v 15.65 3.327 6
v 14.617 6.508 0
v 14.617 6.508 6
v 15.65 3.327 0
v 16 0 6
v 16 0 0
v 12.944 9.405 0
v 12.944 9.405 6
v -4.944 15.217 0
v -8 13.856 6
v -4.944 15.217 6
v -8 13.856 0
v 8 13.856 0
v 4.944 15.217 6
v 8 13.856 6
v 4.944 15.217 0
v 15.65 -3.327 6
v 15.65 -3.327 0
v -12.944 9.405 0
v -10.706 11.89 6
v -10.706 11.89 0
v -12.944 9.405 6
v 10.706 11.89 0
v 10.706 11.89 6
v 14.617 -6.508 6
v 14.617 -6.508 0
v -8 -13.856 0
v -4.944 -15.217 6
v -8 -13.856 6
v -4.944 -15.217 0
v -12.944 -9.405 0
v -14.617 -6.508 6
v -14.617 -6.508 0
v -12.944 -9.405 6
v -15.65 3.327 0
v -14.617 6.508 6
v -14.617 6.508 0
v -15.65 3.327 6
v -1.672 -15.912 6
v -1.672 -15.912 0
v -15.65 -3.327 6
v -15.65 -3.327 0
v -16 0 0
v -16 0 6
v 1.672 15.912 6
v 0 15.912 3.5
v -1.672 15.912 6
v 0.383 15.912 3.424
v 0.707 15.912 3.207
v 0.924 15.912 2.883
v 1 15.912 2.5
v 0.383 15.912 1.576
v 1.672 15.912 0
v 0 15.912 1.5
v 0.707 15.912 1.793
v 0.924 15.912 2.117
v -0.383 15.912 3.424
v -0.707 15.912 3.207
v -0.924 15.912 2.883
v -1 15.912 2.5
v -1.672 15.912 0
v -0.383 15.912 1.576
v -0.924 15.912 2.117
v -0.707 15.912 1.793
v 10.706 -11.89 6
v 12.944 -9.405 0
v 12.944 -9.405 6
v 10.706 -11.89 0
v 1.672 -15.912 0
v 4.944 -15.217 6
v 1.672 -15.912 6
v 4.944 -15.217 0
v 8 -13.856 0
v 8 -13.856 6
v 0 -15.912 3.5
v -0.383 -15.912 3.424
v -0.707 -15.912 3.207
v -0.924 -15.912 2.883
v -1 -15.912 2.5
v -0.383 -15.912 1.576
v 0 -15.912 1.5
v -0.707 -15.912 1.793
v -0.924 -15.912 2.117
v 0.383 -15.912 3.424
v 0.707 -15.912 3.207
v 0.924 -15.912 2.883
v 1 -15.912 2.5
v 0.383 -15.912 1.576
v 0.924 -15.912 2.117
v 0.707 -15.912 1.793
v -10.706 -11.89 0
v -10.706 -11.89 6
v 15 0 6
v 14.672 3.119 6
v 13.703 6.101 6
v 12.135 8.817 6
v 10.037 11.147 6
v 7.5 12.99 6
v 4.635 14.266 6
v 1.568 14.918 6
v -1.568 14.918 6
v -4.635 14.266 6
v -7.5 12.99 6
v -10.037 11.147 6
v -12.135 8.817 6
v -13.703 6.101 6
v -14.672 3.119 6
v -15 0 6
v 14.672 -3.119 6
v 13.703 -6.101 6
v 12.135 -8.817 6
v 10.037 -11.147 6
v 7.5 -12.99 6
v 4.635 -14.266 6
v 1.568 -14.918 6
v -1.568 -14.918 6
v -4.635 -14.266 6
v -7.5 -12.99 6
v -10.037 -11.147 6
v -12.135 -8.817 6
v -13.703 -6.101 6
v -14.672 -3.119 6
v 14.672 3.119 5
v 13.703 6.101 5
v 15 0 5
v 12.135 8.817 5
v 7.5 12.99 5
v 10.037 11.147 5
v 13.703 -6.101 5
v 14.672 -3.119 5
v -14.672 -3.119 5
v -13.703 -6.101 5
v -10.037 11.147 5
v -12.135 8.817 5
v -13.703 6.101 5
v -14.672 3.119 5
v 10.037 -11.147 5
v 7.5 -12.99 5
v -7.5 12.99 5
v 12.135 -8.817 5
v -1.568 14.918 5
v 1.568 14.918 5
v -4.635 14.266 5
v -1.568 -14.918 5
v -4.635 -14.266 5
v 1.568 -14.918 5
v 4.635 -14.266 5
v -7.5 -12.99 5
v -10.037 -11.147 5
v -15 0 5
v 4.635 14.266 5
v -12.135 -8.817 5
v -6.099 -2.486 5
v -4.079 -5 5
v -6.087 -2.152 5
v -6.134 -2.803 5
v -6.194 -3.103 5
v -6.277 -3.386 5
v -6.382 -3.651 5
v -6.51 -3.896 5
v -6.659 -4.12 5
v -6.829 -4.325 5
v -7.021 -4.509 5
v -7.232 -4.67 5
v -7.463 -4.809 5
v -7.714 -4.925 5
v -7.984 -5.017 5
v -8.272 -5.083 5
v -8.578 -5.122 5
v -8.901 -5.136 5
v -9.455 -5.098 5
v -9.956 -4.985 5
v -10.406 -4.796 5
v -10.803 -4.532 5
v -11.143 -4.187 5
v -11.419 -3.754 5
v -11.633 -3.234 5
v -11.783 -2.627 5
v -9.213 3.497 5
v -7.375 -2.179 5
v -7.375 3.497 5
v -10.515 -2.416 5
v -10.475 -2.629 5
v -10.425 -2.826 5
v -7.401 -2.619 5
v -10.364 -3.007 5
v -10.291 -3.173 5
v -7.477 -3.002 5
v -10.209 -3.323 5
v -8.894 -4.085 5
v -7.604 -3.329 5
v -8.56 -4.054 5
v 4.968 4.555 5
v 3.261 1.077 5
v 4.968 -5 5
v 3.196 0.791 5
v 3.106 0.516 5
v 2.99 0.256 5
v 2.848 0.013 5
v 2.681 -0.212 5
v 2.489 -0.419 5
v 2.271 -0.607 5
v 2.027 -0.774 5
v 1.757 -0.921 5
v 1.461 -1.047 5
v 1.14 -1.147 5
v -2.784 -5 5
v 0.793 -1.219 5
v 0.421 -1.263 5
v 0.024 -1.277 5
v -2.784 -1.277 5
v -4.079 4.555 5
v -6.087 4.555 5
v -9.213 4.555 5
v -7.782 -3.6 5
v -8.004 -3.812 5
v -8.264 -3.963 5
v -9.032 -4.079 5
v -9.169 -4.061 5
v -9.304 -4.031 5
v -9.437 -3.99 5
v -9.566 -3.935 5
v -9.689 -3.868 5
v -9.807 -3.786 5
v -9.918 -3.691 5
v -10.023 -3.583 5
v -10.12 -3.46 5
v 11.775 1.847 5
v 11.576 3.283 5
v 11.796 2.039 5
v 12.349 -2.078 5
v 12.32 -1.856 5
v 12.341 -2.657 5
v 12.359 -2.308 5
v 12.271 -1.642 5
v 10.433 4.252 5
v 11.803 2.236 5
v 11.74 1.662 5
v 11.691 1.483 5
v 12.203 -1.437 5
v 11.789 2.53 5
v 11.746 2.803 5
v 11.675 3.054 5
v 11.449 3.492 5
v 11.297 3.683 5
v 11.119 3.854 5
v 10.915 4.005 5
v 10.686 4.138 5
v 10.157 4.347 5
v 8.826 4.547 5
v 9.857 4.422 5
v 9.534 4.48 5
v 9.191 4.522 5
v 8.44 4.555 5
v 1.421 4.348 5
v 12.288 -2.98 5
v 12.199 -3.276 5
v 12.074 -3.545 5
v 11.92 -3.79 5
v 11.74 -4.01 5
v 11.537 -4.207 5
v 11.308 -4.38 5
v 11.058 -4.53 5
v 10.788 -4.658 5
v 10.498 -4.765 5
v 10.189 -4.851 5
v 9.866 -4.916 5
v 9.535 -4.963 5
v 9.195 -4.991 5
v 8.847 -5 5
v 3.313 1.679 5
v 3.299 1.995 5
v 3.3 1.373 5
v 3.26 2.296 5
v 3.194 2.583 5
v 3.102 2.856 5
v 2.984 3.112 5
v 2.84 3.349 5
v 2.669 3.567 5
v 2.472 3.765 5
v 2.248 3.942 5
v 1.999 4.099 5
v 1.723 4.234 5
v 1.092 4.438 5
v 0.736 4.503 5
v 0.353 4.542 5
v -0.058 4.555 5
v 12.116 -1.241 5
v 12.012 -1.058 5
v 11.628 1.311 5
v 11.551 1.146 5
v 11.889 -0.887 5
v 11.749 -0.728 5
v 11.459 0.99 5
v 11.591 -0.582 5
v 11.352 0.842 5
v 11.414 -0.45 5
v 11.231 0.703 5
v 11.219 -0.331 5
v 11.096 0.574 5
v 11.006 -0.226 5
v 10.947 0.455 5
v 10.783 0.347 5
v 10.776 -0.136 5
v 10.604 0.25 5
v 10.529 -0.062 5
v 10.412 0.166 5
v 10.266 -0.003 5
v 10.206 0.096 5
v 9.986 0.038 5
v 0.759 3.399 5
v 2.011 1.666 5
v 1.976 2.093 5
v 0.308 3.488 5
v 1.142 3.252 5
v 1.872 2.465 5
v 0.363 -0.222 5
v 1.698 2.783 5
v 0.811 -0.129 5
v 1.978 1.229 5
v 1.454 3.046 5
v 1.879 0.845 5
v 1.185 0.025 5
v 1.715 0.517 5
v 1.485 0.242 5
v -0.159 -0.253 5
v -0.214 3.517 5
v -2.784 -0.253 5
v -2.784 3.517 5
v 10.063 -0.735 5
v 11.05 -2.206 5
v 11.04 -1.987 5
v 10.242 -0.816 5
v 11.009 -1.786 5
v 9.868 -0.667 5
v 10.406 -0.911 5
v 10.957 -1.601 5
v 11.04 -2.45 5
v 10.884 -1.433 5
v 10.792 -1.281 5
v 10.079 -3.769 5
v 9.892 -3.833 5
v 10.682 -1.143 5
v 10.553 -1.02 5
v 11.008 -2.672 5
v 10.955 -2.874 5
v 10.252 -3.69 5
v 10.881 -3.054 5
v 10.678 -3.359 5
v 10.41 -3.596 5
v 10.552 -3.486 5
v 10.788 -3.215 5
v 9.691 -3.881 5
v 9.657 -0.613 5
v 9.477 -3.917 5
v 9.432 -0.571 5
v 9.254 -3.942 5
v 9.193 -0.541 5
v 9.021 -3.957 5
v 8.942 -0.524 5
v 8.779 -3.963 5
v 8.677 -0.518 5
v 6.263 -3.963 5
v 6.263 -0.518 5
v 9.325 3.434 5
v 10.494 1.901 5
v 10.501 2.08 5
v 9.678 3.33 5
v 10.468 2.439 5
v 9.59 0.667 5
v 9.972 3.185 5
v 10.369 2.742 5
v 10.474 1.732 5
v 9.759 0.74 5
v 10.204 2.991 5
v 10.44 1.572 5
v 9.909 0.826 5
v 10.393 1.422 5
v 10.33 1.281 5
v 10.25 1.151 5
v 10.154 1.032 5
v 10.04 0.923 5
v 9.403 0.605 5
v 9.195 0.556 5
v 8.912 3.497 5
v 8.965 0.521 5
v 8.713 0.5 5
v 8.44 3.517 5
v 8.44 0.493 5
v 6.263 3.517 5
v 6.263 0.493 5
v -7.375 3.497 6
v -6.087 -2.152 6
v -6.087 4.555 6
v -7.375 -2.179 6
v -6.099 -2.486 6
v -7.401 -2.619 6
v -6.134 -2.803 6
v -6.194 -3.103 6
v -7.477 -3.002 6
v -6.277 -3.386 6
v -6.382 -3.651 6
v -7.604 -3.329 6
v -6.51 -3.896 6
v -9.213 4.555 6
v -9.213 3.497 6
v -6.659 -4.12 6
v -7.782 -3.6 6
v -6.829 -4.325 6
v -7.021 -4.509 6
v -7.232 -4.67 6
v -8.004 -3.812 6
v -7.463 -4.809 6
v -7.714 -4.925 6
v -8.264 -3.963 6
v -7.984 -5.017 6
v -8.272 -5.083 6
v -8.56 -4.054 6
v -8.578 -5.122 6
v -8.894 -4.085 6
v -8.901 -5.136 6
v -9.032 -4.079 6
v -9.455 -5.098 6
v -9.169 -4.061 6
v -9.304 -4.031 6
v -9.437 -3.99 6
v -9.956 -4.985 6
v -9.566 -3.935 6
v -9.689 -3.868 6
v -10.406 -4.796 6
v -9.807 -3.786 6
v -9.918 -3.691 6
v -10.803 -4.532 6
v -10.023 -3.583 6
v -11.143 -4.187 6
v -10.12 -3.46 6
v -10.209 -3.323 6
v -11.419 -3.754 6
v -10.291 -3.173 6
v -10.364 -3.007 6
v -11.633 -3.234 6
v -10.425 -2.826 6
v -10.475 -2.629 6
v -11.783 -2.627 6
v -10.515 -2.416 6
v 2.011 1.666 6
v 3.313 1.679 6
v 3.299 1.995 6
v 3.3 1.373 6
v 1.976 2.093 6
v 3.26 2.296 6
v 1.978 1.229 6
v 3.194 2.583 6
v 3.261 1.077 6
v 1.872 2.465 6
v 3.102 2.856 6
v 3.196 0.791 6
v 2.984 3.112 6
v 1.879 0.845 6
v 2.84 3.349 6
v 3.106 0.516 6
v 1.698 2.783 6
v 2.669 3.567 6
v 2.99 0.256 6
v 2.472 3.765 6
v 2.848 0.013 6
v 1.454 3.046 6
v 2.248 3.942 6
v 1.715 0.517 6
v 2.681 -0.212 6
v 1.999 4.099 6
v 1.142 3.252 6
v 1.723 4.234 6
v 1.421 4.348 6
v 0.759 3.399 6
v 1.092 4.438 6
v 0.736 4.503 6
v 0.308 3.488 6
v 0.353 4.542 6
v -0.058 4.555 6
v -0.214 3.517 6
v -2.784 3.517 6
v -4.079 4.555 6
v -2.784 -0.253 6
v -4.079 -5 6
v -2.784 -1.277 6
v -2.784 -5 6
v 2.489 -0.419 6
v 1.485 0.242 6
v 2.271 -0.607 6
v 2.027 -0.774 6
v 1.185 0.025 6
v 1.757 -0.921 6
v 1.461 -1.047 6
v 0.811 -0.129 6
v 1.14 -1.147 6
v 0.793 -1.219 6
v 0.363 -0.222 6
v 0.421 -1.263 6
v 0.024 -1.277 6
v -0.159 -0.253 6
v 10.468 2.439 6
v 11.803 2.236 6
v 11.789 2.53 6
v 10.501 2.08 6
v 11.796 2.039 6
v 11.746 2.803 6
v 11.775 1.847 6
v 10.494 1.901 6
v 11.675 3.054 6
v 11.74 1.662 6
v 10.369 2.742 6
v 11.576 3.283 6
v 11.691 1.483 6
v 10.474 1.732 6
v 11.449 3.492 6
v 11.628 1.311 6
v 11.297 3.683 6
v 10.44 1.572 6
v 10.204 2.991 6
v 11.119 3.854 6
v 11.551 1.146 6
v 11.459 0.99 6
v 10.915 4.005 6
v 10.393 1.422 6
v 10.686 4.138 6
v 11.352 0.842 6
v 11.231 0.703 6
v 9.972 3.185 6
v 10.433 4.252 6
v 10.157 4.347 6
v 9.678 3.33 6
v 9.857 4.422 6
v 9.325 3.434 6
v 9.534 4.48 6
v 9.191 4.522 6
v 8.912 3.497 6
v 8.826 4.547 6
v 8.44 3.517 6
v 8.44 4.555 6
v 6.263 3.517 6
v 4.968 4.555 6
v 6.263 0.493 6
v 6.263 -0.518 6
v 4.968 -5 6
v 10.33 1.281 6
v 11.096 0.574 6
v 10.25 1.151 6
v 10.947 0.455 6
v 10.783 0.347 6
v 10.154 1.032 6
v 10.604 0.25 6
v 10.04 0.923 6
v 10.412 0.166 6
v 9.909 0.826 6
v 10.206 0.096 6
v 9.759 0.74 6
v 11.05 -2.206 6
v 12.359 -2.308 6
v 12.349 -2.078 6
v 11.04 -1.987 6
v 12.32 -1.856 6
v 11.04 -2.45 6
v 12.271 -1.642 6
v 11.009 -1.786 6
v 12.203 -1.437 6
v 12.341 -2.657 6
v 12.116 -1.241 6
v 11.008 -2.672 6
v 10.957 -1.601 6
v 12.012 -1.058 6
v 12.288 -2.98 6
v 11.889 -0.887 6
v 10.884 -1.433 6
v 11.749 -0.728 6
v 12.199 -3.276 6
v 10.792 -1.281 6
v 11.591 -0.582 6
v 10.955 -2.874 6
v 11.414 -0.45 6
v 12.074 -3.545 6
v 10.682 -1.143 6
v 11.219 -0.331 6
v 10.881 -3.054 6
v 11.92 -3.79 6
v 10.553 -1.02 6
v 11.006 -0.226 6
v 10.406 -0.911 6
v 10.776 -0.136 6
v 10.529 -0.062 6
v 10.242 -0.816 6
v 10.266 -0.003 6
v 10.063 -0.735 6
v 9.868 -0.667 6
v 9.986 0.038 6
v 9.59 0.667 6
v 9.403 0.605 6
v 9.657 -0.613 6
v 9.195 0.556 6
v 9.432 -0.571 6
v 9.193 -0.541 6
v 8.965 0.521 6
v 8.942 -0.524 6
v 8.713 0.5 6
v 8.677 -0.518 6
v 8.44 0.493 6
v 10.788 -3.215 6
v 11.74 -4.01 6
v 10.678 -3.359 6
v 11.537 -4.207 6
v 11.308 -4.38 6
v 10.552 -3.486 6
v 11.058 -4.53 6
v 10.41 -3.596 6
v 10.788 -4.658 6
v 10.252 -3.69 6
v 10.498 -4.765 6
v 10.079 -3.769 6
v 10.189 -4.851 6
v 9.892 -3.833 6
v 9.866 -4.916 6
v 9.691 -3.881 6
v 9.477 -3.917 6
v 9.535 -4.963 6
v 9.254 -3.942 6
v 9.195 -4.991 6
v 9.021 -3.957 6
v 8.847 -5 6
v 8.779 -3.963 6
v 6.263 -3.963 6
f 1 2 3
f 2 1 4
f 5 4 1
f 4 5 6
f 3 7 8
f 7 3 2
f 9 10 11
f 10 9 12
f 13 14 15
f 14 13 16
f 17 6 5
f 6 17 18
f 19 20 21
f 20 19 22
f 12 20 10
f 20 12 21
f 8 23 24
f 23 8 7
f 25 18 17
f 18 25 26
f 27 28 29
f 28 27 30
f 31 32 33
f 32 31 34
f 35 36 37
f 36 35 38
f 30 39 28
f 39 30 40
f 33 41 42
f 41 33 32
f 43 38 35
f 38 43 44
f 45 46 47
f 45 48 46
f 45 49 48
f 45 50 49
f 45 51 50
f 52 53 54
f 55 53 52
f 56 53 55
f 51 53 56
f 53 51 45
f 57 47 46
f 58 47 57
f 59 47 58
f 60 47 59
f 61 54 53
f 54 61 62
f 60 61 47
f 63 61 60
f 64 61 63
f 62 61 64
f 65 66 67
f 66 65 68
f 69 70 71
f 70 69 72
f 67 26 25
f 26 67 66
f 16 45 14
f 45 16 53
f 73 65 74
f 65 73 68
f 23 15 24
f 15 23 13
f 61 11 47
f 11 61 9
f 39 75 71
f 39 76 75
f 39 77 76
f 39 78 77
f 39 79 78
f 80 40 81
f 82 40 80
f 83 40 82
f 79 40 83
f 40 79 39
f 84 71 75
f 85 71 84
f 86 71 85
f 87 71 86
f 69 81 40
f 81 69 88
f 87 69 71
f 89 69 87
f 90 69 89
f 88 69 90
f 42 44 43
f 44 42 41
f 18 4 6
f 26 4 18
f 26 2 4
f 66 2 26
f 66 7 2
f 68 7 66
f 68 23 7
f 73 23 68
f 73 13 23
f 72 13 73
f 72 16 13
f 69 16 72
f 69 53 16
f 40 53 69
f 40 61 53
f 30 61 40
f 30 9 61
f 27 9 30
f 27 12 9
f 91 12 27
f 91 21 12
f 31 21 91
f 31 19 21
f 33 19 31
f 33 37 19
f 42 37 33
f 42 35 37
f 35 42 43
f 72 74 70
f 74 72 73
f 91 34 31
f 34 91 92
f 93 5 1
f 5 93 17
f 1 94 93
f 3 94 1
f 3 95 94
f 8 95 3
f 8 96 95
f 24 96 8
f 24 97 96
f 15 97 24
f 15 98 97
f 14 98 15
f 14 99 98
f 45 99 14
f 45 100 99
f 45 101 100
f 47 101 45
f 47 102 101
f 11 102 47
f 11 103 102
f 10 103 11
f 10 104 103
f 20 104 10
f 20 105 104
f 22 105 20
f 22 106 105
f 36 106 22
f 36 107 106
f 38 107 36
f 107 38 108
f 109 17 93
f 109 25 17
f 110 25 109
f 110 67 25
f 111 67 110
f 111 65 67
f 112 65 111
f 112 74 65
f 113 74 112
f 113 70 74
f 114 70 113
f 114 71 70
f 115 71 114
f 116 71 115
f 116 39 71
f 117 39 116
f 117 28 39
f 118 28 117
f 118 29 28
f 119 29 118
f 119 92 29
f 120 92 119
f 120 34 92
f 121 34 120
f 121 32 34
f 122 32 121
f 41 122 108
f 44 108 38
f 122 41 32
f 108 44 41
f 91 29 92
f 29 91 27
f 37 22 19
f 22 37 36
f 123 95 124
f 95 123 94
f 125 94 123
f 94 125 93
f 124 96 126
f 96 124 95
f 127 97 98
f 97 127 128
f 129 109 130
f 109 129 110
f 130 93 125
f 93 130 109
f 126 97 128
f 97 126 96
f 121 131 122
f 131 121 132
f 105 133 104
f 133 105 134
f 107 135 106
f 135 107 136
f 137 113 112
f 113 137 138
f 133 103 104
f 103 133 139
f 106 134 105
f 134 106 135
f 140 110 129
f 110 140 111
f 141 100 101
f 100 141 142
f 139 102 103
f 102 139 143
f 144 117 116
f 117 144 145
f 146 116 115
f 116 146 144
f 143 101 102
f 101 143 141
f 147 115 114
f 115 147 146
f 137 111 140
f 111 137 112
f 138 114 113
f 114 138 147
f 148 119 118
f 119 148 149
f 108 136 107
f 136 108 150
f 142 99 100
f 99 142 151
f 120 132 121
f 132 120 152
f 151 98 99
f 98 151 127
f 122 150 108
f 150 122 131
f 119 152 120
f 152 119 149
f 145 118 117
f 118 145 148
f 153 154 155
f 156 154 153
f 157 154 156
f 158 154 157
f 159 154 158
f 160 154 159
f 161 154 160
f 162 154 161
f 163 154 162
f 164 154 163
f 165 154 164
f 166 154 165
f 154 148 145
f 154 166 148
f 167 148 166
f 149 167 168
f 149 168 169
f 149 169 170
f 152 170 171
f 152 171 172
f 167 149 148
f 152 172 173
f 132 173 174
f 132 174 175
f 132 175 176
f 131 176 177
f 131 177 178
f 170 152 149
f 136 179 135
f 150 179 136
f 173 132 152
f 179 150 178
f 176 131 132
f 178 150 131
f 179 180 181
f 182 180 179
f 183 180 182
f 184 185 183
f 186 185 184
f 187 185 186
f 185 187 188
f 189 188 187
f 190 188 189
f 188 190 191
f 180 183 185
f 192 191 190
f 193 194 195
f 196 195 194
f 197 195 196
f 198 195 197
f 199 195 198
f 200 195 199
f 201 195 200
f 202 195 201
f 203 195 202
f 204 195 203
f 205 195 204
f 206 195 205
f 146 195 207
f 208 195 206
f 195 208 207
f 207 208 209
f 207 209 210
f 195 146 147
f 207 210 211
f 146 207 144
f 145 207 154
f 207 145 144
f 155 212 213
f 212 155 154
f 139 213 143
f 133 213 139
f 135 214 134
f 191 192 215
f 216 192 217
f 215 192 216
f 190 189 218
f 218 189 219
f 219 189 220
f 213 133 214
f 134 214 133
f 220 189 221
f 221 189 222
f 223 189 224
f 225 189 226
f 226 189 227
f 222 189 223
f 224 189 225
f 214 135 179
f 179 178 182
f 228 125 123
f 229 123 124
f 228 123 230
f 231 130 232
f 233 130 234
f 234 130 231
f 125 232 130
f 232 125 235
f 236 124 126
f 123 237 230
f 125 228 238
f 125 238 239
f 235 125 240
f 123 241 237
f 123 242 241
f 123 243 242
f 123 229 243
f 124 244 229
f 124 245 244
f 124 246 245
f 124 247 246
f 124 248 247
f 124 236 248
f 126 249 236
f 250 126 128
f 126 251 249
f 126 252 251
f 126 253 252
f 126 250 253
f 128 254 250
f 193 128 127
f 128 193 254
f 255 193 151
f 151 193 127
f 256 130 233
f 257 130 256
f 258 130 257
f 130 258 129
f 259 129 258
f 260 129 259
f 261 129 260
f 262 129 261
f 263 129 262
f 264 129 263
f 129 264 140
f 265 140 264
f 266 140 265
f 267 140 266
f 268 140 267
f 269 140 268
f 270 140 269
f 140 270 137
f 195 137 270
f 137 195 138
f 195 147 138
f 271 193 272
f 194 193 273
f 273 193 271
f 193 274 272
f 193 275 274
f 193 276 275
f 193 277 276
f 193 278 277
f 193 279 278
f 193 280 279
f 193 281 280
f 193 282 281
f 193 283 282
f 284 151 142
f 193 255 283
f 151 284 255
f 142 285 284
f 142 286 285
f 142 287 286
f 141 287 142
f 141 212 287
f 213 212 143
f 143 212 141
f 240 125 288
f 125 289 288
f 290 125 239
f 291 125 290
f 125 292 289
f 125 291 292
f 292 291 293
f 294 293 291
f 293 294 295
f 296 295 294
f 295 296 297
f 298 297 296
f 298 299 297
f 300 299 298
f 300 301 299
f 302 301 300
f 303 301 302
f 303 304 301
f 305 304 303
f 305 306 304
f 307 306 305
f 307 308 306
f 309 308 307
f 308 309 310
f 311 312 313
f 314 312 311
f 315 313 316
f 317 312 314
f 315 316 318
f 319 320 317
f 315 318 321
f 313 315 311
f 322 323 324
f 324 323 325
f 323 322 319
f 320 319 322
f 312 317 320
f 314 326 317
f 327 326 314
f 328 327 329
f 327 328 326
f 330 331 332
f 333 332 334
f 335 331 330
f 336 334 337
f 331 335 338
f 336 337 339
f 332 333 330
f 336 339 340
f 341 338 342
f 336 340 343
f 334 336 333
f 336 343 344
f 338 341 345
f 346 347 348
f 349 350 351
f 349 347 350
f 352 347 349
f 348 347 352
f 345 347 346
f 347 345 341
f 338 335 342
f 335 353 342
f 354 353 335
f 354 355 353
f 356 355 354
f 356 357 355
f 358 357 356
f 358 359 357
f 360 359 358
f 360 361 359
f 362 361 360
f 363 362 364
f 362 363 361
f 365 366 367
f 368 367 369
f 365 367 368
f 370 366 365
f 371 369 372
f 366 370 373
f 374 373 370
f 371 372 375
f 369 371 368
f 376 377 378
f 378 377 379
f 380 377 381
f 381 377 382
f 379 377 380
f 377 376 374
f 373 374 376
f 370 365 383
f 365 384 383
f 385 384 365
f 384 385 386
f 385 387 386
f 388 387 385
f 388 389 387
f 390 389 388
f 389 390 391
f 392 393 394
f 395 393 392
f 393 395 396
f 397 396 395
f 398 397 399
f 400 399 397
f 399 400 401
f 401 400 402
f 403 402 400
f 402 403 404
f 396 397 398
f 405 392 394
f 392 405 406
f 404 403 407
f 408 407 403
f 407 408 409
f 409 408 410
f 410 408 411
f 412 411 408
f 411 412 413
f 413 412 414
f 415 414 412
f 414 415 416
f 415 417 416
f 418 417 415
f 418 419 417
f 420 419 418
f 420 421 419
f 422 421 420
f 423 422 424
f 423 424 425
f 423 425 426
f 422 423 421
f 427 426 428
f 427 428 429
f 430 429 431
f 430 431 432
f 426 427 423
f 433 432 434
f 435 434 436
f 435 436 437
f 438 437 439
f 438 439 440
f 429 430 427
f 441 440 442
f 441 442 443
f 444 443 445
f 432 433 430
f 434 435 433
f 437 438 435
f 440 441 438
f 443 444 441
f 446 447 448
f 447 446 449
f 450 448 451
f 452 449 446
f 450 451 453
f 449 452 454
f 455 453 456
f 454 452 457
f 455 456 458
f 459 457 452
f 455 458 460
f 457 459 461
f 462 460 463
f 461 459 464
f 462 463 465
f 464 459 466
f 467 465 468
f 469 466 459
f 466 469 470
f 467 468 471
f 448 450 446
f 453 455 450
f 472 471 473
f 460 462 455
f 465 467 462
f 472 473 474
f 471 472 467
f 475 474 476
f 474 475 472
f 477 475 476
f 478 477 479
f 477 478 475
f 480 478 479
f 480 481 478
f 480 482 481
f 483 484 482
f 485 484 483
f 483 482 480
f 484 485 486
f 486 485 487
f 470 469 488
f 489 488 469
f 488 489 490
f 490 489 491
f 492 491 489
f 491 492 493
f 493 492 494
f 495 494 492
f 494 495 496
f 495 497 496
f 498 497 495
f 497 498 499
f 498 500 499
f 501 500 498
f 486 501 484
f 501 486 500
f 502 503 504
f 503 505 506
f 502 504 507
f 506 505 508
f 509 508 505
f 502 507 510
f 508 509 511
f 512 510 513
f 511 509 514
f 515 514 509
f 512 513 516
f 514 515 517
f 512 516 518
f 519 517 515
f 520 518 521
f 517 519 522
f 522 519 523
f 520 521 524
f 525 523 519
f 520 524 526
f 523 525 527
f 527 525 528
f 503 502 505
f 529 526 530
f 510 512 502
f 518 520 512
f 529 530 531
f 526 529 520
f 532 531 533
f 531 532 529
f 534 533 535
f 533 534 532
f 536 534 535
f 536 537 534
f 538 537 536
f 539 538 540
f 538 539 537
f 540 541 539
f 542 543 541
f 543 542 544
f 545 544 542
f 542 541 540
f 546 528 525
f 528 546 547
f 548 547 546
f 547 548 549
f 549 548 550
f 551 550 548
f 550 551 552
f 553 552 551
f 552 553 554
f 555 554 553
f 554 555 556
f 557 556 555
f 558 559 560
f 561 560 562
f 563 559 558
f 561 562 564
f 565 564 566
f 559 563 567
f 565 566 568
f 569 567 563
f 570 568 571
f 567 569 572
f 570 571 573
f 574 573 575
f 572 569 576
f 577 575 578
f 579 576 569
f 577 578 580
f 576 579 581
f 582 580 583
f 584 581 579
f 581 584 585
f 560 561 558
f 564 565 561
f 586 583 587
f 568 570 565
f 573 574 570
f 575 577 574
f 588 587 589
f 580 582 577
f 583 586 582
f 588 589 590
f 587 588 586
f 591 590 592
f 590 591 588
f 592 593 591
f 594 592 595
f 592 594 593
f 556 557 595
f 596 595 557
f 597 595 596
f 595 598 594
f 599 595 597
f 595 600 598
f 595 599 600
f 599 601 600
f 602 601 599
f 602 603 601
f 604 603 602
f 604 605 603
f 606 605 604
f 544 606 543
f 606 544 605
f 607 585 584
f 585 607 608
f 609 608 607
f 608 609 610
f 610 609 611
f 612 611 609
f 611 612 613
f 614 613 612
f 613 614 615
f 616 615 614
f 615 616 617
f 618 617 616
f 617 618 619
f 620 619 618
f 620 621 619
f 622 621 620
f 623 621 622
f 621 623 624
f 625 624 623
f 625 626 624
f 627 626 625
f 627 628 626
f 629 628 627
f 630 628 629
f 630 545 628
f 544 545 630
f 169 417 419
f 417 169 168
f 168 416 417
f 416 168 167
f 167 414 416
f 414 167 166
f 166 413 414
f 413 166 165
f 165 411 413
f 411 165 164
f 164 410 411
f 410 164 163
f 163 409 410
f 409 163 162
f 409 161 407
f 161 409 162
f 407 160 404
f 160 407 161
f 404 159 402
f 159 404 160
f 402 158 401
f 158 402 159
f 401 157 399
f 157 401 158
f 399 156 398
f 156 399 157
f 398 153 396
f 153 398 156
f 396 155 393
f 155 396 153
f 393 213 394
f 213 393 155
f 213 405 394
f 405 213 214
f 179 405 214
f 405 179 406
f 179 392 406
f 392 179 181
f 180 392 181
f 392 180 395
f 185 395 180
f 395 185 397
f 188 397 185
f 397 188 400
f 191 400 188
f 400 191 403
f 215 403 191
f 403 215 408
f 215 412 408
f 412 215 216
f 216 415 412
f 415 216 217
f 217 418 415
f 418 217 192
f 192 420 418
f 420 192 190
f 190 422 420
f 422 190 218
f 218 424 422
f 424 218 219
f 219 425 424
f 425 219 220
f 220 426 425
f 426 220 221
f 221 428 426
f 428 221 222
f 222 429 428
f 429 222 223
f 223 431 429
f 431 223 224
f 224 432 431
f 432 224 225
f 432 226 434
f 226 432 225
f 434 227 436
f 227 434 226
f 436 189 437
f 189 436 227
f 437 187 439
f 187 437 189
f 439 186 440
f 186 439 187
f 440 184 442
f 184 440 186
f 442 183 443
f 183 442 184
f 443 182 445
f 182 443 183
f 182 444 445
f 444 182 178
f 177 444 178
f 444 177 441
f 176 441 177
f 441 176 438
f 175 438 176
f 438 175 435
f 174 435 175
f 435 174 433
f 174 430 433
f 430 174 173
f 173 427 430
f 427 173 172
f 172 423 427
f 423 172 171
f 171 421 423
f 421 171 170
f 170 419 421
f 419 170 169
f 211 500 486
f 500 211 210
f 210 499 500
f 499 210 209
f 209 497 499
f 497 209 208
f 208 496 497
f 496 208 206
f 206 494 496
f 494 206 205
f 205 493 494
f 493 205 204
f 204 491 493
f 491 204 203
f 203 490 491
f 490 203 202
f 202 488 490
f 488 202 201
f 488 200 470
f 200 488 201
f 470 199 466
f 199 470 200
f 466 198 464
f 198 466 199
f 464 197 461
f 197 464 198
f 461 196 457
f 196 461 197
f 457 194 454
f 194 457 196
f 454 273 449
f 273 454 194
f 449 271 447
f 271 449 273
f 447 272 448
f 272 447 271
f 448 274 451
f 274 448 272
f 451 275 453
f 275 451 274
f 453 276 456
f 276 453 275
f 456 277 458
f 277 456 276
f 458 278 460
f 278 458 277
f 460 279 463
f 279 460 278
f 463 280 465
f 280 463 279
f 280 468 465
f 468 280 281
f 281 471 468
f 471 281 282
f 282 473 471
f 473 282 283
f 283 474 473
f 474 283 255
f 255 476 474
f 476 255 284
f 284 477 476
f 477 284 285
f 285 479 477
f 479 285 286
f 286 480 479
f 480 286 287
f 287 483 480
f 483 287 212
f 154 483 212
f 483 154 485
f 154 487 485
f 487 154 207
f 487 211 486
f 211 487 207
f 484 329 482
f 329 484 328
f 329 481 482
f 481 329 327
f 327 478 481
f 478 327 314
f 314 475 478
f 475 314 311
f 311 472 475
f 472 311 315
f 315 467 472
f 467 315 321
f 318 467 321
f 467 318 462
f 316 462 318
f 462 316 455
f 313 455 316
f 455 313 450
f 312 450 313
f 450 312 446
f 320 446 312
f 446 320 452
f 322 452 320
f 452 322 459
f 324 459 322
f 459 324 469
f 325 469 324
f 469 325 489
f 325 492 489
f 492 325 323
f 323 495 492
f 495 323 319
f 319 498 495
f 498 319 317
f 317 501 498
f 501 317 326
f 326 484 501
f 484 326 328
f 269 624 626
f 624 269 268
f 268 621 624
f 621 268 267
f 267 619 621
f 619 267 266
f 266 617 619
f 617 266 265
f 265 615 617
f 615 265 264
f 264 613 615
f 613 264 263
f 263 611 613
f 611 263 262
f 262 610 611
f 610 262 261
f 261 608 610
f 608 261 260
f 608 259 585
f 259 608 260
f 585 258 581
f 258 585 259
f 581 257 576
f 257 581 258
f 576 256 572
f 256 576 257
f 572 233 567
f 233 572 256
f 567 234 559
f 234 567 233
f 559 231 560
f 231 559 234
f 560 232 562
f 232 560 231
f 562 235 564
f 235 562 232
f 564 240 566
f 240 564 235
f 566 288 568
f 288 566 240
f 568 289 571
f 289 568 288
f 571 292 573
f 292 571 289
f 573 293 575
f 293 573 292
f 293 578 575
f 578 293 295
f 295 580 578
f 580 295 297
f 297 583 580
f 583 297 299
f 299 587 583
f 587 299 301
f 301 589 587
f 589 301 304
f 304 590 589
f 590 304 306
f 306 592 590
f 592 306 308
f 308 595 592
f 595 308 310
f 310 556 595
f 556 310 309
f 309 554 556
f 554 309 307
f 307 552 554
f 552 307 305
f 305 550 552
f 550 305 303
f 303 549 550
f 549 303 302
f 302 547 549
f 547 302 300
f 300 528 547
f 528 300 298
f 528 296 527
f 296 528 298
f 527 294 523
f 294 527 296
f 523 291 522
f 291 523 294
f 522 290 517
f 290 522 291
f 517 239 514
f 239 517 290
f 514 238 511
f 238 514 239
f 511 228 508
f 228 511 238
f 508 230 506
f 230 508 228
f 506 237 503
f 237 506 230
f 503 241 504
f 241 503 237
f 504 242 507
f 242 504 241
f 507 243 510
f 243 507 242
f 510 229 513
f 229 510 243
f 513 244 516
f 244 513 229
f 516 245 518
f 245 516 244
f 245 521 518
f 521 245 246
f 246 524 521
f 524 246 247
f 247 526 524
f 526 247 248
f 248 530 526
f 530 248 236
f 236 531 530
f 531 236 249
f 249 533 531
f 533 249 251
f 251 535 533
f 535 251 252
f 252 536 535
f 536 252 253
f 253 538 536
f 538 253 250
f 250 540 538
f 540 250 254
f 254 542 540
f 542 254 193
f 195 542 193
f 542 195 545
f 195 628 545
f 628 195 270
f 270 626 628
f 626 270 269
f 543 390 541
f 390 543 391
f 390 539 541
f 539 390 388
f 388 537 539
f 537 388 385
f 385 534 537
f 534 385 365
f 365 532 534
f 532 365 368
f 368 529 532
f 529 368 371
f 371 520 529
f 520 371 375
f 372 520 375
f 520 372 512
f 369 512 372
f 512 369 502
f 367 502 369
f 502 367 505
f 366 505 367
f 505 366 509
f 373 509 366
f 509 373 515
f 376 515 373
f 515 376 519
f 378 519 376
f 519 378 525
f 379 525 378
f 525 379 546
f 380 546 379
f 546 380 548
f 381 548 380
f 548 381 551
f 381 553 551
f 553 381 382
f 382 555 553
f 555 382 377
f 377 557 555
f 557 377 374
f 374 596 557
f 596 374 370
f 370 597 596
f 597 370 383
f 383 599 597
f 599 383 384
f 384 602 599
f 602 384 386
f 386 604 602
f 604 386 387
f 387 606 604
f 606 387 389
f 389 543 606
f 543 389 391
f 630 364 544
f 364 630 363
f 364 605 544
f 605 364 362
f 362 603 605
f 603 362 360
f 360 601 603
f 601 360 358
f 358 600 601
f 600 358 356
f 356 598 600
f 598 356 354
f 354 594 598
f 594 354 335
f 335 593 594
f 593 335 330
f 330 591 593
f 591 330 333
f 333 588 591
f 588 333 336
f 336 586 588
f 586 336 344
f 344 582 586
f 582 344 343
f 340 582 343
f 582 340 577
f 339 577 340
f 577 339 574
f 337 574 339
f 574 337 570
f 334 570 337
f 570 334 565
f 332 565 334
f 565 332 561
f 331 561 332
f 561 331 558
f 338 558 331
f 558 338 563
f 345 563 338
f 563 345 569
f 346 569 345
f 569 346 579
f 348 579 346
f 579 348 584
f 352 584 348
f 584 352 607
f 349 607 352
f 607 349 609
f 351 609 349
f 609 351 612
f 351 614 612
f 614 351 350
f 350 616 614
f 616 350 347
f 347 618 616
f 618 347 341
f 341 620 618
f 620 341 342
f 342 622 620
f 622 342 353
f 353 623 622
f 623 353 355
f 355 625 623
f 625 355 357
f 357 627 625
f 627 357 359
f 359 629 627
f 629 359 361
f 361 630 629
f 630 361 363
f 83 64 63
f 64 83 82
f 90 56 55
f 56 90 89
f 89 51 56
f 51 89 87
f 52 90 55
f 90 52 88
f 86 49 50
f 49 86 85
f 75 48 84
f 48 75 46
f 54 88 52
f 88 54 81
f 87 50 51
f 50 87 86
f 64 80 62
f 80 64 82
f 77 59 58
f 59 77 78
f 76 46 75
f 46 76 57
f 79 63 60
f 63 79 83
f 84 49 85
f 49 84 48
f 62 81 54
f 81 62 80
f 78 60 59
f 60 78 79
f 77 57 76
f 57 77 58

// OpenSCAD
difference(){
union(){
difference(){
cylinder(r=16,h=6);
cylinder(r=15,h=10);
}    


cylinder(r=15,h=5);
translate([-12,-5,5])scale([1,1,0.010])
linear_extrude(h=5)text("JPB");


}

translate([0,-20,2.5])rotate([-90,0,0])cylinder(r=1,h=50,$fn=16);
}
